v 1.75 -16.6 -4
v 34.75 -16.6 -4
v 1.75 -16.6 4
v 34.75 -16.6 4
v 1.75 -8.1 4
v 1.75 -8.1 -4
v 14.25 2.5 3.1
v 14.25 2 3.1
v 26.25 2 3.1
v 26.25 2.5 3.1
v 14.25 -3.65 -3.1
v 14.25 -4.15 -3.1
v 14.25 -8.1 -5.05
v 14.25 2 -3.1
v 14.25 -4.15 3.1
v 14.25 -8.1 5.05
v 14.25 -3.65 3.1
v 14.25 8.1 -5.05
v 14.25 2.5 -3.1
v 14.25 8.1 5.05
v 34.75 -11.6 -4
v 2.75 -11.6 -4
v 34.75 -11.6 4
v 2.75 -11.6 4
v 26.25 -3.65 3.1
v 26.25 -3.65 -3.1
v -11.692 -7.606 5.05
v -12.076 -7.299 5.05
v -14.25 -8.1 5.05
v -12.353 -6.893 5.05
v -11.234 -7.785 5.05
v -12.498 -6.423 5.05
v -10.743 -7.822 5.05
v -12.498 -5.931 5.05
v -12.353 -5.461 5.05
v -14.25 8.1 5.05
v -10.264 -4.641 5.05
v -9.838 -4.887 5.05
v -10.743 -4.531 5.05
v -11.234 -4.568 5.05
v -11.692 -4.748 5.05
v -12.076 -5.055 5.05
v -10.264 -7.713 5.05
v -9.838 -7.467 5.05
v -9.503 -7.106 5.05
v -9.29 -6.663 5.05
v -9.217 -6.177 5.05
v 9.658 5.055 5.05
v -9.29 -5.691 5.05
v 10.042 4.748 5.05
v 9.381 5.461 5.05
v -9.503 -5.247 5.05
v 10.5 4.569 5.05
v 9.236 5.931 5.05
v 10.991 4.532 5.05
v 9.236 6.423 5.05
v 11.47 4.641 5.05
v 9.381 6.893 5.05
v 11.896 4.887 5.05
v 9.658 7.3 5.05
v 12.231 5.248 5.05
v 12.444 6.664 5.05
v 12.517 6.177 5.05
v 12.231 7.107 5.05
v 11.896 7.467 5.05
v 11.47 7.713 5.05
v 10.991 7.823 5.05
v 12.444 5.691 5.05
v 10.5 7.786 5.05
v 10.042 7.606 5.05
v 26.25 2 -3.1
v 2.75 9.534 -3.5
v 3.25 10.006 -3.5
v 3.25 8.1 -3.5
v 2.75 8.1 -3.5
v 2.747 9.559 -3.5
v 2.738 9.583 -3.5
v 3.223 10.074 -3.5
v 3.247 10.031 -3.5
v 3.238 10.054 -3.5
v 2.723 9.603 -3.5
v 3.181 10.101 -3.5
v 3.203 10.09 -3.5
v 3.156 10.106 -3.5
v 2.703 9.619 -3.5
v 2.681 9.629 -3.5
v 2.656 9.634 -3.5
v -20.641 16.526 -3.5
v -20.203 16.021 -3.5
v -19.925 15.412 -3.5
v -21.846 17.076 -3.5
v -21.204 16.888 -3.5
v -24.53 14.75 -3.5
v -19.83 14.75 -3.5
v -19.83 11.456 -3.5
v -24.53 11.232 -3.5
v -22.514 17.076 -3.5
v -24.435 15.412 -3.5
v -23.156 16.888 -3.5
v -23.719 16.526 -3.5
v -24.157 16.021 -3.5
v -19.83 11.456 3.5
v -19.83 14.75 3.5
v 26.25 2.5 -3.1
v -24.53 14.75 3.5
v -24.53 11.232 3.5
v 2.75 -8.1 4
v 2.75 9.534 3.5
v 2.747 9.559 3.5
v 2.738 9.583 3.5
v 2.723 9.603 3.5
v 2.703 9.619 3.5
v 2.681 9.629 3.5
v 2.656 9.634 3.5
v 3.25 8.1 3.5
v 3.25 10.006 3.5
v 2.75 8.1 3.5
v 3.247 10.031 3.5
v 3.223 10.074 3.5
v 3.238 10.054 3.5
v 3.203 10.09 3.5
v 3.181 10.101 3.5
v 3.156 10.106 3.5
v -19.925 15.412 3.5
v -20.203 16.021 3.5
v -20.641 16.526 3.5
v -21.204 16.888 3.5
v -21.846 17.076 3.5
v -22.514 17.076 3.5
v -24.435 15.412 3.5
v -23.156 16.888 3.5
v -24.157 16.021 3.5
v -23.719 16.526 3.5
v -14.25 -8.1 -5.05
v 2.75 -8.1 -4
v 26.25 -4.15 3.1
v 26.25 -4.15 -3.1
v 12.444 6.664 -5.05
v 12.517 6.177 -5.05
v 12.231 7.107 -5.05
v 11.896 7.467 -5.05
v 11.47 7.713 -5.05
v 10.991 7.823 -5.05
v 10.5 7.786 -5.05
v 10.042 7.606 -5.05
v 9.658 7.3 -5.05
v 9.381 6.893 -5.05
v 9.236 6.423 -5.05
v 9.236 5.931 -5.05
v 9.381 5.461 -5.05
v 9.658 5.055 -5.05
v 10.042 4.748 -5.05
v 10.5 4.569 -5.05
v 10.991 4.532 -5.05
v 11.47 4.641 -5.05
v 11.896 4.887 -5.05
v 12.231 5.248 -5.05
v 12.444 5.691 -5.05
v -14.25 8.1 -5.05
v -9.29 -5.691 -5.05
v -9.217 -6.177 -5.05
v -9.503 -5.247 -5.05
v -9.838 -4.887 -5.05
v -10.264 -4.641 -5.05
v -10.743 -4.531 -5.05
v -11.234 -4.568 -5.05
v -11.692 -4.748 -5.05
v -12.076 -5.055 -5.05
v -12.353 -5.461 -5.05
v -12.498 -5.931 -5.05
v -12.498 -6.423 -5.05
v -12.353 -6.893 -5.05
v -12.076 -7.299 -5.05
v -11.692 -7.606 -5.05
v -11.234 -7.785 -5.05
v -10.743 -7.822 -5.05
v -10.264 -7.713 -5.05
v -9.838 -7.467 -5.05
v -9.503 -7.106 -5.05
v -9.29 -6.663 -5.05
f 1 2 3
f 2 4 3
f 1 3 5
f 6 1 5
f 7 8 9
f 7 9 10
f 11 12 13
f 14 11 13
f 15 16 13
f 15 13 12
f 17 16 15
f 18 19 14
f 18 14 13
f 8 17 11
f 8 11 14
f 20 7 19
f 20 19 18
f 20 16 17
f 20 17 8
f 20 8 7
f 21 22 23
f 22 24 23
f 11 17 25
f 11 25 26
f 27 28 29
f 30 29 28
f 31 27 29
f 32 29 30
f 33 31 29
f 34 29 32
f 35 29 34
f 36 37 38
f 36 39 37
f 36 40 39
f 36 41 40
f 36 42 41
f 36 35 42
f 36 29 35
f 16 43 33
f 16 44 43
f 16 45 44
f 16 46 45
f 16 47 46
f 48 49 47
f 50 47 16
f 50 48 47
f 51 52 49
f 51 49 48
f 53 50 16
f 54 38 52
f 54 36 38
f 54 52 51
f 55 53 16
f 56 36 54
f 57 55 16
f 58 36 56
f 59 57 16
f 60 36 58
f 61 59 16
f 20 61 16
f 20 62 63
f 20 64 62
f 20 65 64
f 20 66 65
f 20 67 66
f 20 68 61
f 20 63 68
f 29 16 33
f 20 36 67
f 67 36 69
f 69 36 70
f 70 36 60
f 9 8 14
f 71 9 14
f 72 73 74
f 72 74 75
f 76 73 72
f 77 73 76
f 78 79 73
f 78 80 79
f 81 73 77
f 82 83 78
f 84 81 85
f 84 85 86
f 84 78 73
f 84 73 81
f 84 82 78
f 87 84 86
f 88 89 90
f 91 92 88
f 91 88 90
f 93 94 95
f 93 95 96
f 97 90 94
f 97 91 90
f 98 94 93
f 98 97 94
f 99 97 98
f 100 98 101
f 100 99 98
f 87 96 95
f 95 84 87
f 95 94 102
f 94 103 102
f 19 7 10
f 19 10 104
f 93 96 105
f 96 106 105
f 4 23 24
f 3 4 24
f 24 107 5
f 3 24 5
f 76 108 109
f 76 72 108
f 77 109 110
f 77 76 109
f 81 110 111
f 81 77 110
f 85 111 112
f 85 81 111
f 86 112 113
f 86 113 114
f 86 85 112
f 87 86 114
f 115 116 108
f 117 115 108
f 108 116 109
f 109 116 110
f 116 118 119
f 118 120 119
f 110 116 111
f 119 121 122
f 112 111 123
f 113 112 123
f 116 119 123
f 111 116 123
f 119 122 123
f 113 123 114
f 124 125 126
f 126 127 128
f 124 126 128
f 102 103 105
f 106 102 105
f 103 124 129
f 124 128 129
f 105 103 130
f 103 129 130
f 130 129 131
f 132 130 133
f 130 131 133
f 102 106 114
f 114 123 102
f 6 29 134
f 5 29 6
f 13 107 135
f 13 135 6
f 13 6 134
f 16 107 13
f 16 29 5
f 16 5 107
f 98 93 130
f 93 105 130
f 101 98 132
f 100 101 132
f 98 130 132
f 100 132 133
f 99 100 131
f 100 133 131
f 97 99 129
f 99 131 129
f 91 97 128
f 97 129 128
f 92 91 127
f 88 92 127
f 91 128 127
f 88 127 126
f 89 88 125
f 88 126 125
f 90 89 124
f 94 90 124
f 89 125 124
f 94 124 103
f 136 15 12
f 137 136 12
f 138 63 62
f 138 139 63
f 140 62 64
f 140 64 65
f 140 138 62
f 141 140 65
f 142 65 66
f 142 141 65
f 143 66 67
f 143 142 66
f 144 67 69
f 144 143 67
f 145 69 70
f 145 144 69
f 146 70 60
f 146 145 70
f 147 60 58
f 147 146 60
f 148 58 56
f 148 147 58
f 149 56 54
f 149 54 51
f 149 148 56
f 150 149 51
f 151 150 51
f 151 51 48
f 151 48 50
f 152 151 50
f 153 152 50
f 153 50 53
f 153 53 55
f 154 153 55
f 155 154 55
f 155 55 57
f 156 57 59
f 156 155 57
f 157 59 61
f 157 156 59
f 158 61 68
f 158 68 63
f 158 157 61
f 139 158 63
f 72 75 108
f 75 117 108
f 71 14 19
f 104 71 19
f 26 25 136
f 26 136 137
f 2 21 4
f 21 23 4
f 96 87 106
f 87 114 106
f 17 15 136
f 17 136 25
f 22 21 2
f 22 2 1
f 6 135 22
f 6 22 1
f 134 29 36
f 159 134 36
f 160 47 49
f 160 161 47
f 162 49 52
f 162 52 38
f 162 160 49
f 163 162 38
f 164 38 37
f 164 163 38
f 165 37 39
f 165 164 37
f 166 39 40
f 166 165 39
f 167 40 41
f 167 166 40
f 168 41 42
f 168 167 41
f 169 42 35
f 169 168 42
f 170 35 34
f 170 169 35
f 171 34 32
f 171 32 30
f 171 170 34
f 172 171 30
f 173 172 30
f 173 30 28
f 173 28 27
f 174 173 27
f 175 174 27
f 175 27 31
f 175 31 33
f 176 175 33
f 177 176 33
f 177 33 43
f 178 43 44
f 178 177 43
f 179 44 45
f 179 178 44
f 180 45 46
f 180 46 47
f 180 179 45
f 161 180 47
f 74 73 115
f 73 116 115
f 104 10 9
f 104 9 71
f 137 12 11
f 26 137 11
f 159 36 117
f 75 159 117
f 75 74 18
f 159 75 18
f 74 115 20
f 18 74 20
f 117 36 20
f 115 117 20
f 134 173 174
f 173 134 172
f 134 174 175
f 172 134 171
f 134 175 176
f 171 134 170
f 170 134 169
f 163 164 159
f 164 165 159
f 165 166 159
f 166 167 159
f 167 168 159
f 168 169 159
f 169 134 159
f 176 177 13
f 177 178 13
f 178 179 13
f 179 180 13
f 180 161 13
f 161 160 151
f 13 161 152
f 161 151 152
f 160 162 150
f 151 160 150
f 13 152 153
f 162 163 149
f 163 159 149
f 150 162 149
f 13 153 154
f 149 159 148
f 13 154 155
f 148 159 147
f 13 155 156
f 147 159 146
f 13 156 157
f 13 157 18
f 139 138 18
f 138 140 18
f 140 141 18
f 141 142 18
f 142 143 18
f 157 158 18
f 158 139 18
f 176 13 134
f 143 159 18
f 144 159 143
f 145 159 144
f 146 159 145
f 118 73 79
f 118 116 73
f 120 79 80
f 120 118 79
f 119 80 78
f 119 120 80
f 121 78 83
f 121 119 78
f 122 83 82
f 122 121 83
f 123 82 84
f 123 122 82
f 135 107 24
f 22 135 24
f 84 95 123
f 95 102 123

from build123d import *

# Parameters (mm, degrees)
ESQUISSE1_W        = 28.5
ESQUISSE1_H        = 16.2
ESQUISSE1_R        = 1.65
BOSS_EXTRU_1_DEPTH = 5.05
BOSS_EXTRU_2_DEPTH = 3.5
CONG_1_R           = 0.1
ESQUISSE3_W        = 6.2
ESQUISSE3_H        = 0.5
BOSS_EXTRU_3_DEPTH = 12
BOSS_EXTRU_4_DEPTH = 4


with BuildPart() as part:
    # Esquisse1 → Boss.-Extru.1 (new, symmetric)
    with BuildSketch(Plane.XY):
        Rectangle(ESQUISSE1_W, ESQUISSE1_H)
        with Locations((-10.866713513, -6.176868734)):
            Circle(ESQUISSE1_R, mode=Mode.SUBTRACT)
        with Locations((10.867466751, 6.17729689)):
            Circle(ESQUISSE1_R, mode=Mode.SUBTRACT)
    extrude(amount=BOSS_EXTRU_1_DEPTH, both=True)

    # Esquisse2 → Boss.-Extru.2 (add, symmetric)
    with BuildSketch(Plane.XY):
        with BuildLine():
            Line((2.75, 8.1), (2.75, 9.628523069))
            Line((2.75, 9.628523069), (-24.53, 11.231815184))
            Line((-24.53, 11.231815184), (-24.53, 14.75))
            ThreePointArc((-24.53, 14.75), (-22.18, 17.1), (-19.83, 14.75))
            Line((-19.83, 14.75), (-19.83, 11.456450954))
            Line((-19.83, 11.456450954), (3.25, 10.1))
            Line((3.25, 10.1), (3.25, 8.1))
            Line((3.25, 8.1), (2.75, 8.1))
        make_face()
    extrude(amount=BOSS_EXTRU_2_DEPTH, both=True)

    # Congé1
    cong_1_edges = [part.edges().sort_by_distance(p)[0] for p in [
        (3.25, 10.1, 0),
        (2.75, 9.628523069, 0),
    ]]
    fillet(cong_1_edges, radius=CONG_1_R)

    # Esquisse3 → Boss.-Extru.3 (add)
    with BuildSketch(Plane(origin=(14.25, 0, 0), x_dir=(0, 0, -1), z_dir=(1, 0, 0))):
        with Locations((0, 2.25)):
            Rectangle(ESQUISSE3_W, ESQUISSE3_H)
        with Locations((0, -3.9)):
            Rectangle(ESQUISSE3_W, ESQUISSE3_H)
    extrude(amount=BOSS_EXTRU_3_DEPTH)

    # Esquisse4 → Boss.-Extru.4 (add, symmetric)
    with BuildSketch(Plane.XY):
        Polygon((2.75, -8.1), (2.75, -11.6), (34.75, -11.6), (34.75, -16.6), (1.75, -16.6), (1.75, -8.1), align=None)
    extrude(amount=BOSS_EXTRU_4_DEPTH, both=True)


solid = part.part
